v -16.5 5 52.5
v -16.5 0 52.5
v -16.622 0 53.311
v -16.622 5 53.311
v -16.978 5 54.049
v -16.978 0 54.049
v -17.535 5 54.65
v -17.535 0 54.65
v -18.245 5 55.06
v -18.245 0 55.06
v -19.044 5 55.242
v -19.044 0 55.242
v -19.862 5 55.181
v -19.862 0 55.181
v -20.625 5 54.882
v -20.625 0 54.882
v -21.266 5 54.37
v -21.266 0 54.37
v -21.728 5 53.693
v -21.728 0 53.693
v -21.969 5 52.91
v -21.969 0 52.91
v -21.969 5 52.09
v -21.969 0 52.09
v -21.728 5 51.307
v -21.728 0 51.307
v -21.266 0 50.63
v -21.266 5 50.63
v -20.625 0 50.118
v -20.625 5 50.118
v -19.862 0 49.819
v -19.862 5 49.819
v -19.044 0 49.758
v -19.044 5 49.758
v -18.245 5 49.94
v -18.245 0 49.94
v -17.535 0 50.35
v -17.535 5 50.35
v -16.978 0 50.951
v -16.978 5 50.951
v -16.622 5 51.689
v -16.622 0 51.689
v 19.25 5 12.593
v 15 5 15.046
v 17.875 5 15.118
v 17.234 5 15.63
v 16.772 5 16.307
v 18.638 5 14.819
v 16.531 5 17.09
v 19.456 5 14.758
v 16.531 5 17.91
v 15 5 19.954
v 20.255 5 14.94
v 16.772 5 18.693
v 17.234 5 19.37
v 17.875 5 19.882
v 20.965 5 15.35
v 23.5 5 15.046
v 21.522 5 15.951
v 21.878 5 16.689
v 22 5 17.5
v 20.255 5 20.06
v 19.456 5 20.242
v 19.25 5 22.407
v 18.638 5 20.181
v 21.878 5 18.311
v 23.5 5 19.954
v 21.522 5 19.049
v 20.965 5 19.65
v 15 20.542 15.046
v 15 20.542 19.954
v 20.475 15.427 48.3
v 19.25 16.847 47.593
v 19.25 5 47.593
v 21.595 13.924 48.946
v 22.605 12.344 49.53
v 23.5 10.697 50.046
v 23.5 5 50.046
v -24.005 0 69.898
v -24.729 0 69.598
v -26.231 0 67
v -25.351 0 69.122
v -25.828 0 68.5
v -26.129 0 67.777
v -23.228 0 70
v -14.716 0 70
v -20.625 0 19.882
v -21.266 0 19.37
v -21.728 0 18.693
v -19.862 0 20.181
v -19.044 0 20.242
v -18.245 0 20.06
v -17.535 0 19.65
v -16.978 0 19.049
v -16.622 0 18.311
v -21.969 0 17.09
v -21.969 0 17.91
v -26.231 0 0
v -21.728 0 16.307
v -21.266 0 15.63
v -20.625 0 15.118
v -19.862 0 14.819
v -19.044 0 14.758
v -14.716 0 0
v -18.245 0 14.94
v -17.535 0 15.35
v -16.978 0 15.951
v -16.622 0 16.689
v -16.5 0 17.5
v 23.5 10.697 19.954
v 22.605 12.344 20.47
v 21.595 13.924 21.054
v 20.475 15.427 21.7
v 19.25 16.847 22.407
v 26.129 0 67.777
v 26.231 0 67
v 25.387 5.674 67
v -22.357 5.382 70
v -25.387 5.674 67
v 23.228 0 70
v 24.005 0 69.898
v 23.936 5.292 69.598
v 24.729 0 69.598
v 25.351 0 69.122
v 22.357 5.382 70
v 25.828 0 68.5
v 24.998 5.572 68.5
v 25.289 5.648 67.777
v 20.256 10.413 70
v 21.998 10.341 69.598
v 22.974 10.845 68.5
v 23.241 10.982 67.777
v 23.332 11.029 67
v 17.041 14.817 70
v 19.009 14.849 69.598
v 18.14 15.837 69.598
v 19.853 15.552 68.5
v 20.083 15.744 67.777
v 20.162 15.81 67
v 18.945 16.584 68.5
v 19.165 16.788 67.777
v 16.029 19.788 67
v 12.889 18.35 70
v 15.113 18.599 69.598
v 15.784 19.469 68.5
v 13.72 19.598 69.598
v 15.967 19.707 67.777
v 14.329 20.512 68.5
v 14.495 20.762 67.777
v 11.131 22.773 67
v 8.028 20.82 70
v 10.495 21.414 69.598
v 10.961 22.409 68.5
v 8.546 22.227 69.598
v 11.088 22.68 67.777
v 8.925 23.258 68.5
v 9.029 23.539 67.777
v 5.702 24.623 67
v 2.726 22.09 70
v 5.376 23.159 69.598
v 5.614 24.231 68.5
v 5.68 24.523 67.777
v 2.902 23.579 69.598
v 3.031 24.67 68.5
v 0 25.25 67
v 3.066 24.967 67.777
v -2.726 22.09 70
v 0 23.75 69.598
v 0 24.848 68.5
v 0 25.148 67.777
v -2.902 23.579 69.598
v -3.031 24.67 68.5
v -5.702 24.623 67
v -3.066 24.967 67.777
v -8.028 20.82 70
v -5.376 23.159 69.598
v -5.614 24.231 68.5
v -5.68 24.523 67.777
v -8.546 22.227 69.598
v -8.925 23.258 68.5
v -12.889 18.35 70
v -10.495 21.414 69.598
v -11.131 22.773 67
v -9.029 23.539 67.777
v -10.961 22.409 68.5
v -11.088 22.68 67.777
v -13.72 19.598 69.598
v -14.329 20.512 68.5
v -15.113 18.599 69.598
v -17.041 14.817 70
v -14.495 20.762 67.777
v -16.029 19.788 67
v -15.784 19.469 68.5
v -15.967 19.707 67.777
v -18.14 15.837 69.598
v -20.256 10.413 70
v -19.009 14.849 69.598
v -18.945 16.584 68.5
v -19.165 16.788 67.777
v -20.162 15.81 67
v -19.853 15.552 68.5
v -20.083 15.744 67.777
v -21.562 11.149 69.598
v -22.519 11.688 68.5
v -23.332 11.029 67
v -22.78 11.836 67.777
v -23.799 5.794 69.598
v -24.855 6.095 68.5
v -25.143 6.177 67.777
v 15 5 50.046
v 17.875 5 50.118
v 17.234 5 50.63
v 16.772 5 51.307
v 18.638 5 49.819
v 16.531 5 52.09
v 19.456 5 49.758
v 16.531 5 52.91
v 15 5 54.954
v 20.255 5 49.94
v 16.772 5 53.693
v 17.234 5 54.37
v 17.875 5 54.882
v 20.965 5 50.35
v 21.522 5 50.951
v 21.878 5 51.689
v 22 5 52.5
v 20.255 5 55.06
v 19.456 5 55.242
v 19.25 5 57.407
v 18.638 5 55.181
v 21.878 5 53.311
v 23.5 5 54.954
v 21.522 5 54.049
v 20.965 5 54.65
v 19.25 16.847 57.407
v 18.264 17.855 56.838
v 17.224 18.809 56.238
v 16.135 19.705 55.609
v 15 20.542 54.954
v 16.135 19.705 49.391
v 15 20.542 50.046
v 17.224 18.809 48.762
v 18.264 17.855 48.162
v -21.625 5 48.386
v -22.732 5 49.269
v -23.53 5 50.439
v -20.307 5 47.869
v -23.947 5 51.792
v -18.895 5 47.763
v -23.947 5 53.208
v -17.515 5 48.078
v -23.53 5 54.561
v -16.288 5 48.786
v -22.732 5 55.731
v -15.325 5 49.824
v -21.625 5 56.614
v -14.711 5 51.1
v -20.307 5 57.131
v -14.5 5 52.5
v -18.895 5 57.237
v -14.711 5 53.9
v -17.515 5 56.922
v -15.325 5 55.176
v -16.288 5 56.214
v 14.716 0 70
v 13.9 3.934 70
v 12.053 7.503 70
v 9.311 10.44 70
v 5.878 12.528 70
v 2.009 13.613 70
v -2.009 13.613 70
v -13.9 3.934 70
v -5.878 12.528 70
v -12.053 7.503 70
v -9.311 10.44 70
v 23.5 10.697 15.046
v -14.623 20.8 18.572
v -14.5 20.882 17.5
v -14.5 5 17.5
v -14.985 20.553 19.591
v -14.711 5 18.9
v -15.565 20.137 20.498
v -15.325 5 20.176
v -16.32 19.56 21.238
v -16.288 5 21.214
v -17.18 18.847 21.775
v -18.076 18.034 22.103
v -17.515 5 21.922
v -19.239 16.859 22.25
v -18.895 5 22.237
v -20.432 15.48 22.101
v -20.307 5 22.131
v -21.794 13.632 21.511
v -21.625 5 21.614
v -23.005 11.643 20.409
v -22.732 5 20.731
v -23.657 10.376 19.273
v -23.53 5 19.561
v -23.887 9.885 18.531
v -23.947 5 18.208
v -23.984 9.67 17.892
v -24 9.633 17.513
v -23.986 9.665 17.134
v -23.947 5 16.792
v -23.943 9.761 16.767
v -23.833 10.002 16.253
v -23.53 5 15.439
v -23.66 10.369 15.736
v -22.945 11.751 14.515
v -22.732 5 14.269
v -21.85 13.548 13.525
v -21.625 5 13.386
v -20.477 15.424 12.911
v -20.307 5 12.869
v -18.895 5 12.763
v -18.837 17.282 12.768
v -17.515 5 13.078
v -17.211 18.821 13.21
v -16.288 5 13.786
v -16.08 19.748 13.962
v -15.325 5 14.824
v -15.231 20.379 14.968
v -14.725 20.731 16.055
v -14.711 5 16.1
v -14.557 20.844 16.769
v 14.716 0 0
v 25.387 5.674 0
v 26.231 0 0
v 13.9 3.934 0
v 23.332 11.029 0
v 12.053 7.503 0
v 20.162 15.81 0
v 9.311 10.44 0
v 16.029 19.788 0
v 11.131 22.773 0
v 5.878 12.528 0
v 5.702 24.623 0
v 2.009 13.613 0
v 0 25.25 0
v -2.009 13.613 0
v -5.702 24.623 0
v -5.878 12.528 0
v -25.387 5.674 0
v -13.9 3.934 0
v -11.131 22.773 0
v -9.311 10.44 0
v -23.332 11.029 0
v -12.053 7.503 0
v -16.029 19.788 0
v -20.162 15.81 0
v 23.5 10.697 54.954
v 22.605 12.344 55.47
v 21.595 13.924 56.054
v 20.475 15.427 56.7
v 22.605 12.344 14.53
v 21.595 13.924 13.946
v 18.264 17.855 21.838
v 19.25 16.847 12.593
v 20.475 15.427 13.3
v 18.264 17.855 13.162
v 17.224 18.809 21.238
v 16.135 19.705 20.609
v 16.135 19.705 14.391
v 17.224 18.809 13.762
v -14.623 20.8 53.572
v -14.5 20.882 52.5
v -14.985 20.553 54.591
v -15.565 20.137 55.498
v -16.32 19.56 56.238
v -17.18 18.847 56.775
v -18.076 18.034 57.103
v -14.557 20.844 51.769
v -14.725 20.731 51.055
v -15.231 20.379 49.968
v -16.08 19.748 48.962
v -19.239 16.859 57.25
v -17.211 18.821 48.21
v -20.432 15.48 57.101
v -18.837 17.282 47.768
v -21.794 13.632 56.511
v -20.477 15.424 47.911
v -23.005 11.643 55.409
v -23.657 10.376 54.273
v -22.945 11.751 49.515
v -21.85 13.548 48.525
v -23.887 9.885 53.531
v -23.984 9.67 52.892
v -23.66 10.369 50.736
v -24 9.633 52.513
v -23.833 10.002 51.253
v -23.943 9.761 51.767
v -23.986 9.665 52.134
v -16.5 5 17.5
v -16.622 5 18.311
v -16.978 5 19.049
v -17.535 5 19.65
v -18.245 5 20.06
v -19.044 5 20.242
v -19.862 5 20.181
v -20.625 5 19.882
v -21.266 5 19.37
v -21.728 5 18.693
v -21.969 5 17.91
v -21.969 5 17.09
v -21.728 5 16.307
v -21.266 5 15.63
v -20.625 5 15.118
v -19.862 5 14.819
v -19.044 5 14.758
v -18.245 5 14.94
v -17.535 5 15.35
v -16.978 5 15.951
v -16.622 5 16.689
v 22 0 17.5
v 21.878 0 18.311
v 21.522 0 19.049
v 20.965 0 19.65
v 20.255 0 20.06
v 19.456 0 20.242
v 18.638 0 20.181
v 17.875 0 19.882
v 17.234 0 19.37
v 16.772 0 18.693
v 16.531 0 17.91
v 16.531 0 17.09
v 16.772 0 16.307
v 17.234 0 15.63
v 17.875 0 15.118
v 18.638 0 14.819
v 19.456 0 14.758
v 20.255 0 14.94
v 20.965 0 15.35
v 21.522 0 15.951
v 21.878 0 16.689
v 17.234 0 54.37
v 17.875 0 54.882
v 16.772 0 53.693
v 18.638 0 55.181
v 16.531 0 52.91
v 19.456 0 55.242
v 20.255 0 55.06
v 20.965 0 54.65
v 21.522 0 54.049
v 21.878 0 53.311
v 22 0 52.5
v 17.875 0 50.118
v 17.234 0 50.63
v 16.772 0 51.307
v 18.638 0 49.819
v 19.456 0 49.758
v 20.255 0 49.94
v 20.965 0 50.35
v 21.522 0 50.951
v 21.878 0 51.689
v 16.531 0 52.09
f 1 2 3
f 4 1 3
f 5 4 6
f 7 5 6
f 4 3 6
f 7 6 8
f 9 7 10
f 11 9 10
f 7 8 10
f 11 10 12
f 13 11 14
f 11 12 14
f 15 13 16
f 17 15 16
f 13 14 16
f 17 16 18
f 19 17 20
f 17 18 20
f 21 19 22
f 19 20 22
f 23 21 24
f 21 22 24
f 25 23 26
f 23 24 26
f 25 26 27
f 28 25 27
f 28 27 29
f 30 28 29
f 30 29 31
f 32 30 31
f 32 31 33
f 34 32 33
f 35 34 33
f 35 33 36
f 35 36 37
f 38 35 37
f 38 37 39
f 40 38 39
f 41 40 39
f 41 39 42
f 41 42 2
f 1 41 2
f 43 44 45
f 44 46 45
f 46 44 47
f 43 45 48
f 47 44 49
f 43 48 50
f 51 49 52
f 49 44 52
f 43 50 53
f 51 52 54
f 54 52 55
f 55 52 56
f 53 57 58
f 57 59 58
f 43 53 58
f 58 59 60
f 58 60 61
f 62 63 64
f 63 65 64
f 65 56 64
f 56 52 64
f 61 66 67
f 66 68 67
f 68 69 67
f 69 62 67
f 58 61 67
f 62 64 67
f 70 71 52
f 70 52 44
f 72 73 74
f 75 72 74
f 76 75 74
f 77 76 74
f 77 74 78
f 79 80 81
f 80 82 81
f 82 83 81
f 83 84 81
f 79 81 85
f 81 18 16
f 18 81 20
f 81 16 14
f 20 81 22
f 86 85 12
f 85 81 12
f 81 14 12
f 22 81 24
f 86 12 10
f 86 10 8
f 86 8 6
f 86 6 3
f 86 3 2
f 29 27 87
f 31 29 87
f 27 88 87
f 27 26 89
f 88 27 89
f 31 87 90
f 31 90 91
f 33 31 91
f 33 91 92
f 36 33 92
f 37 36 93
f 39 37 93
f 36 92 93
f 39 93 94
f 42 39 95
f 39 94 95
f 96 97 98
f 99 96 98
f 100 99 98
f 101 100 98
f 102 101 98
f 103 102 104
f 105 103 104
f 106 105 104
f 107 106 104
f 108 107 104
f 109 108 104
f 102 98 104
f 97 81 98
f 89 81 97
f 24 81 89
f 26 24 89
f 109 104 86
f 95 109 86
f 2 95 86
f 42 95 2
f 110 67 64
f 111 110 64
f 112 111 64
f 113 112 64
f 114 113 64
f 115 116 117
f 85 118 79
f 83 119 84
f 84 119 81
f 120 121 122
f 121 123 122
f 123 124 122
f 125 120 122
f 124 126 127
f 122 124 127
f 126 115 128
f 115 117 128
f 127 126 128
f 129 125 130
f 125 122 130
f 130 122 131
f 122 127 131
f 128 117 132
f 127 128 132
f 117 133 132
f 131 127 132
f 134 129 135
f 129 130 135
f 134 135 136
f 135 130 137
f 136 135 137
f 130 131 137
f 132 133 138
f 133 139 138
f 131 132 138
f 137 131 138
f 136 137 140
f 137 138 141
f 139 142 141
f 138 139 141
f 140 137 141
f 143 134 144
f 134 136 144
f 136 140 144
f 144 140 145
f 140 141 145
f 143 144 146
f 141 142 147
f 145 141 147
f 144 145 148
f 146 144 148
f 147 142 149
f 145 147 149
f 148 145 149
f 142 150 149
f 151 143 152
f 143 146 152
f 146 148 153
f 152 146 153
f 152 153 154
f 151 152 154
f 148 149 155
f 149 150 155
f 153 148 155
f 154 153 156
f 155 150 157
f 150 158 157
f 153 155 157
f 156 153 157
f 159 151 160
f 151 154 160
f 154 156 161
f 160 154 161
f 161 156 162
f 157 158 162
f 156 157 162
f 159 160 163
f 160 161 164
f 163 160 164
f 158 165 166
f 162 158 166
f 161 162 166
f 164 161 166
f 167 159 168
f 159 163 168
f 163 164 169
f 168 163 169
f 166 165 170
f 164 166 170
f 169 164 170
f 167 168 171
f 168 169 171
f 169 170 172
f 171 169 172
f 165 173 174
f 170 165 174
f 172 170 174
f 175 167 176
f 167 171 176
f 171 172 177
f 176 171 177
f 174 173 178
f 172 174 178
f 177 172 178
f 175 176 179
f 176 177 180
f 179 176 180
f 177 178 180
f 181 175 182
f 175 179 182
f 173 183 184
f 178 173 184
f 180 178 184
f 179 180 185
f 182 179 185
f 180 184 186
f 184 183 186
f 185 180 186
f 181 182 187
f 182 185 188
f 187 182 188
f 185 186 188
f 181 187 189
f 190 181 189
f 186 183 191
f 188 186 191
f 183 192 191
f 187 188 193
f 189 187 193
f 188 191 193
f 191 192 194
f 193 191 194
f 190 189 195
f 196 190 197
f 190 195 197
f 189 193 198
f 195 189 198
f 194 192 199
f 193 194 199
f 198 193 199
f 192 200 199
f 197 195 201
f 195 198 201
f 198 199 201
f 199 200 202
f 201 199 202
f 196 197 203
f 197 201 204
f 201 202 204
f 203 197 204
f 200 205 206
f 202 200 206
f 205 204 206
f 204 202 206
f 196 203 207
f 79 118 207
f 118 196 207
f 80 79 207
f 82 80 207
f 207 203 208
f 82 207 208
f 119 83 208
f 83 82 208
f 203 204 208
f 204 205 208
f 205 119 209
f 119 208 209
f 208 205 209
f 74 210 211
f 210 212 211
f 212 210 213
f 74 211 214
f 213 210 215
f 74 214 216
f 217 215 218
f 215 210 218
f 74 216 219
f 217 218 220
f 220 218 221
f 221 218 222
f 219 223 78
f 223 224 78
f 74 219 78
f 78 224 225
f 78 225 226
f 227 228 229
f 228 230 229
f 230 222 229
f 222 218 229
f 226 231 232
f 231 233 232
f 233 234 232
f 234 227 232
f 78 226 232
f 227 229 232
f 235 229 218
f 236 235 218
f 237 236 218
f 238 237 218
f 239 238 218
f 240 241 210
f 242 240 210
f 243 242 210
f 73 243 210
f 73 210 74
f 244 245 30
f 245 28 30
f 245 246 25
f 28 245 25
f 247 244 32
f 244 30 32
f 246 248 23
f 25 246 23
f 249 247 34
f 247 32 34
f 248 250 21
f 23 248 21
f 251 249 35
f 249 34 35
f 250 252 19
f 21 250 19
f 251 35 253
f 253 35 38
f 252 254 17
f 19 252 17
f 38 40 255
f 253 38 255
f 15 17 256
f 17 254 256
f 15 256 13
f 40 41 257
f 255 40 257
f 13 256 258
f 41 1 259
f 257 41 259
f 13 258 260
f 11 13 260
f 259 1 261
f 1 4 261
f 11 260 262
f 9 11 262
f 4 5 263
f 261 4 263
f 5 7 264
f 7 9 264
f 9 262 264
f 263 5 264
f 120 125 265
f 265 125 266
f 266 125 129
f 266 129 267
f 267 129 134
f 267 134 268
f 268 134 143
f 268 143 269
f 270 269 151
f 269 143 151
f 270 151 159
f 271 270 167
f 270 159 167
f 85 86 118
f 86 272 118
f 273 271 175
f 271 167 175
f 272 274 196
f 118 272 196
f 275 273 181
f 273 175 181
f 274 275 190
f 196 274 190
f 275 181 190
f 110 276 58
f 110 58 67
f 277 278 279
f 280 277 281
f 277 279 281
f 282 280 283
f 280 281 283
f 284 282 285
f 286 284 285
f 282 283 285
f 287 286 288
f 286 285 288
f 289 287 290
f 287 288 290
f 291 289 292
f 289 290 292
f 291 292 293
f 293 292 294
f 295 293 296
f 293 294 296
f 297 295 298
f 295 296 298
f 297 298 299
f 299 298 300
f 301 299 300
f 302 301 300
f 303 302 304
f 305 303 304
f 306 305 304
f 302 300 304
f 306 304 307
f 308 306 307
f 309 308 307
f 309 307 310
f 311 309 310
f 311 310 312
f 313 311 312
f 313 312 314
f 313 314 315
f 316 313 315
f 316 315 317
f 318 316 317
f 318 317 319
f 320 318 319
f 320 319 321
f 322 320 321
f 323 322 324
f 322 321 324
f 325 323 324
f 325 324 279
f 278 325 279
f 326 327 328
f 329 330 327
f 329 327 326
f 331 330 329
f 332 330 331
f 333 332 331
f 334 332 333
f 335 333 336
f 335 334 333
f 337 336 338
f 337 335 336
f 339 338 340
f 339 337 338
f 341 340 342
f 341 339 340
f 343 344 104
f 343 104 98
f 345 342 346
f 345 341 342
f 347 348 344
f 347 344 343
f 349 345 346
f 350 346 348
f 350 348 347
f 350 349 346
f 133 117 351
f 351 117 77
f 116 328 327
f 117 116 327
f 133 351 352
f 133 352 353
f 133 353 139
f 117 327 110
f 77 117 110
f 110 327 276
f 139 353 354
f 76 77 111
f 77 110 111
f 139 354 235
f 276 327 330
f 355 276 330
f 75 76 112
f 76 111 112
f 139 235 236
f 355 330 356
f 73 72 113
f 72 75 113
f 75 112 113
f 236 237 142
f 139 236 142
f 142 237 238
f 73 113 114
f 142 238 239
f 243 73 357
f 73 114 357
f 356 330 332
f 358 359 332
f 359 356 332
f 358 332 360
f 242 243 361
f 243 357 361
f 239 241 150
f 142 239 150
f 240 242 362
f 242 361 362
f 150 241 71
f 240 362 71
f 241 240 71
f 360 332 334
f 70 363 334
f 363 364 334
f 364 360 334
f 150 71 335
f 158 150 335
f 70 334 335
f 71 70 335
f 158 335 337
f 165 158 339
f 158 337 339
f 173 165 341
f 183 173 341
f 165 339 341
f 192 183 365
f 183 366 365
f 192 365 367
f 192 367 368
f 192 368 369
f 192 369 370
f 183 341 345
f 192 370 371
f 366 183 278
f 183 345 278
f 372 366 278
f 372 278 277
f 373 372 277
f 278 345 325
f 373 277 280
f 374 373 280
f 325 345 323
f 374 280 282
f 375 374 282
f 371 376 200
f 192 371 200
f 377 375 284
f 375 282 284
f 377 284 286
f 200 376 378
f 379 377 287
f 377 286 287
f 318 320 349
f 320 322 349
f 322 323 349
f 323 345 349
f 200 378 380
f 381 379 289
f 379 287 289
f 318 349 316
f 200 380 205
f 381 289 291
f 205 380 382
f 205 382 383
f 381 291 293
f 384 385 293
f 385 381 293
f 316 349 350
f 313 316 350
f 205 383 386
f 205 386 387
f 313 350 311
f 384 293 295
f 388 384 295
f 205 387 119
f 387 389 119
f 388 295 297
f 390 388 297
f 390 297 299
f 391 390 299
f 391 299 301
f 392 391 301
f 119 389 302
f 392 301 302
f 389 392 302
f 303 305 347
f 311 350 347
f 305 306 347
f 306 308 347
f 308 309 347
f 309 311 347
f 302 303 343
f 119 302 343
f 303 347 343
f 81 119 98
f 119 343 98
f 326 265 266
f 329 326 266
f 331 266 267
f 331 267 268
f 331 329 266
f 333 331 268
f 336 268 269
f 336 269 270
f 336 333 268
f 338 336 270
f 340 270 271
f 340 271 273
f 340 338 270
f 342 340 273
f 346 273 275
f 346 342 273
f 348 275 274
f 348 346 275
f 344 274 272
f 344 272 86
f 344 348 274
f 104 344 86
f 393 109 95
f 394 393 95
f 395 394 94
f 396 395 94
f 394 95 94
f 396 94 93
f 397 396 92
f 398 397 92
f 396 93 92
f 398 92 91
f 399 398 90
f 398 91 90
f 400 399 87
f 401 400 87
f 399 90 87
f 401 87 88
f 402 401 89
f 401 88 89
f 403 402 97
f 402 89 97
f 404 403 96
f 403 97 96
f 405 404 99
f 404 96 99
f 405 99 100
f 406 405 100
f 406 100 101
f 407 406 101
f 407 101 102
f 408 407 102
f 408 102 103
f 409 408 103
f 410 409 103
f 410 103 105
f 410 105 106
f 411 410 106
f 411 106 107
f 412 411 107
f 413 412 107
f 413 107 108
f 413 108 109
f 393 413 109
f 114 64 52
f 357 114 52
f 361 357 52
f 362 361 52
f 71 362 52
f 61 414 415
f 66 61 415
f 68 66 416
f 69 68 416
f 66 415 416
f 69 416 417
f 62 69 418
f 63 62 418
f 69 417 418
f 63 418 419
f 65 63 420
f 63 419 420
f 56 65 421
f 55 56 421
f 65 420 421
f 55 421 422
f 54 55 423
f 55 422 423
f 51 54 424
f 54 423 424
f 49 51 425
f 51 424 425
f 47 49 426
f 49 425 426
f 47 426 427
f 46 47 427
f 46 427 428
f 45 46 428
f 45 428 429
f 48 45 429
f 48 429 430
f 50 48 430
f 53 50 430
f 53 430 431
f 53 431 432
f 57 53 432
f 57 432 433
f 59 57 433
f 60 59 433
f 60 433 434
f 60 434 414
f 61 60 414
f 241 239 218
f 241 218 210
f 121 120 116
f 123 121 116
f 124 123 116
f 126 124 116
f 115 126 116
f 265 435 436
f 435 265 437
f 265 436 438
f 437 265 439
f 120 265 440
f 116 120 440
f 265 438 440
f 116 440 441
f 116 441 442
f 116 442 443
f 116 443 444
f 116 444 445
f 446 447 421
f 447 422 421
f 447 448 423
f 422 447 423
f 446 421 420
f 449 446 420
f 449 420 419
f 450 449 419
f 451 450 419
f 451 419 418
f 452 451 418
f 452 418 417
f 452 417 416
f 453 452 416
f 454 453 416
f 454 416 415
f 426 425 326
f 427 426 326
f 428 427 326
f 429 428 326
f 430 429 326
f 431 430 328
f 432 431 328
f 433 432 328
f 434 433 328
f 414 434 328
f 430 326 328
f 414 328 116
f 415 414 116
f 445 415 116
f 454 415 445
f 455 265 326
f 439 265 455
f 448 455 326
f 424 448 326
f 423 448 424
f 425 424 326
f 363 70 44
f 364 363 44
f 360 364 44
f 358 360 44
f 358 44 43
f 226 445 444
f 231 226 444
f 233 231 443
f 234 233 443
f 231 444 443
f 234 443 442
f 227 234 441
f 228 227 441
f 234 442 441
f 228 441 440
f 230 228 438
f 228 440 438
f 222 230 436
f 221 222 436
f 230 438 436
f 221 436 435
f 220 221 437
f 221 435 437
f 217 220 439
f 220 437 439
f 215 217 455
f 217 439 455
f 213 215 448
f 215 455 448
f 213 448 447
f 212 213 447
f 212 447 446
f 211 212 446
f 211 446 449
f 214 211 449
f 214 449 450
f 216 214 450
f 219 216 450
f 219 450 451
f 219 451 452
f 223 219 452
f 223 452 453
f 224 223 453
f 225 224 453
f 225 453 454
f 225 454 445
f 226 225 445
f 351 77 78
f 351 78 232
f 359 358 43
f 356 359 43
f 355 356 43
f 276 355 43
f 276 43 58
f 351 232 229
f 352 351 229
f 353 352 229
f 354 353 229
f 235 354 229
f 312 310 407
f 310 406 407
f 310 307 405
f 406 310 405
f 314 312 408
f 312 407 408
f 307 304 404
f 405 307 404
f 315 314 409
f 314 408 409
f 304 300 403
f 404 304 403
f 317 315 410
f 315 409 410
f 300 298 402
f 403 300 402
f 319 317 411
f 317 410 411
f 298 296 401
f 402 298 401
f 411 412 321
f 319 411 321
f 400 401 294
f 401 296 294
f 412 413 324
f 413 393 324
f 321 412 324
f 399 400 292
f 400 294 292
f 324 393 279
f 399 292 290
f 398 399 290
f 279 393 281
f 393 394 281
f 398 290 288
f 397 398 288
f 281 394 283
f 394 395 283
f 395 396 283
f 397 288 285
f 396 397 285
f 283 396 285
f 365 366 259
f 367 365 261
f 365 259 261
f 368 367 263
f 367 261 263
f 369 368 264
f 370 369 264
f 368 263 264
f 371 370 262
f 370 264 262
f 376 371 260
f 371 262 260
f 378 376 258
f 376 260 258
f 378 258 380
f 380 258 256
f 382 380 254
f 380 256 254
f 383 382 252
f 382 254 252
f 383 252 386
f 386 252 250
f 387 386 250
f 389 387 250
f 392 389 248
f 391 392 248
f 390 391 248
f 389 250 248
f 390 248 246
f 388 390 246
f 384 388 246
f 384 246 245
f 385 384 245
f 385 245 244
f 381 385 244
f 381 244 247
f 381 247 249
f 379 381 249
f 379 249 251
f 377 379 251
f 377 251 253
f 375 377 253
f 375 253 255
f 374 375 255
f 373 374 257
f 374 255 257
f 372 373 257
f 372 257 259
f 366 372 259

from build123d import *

# Parameters (mm, degrees)
PAD_DEPTH       = 70
SKETCH001_R     = 2.75
POCKET_DEPTH    = 25.251
SKETCH002_R     = 4.75
POCKET001_DEPTH = 20.251
FILLET_R        = 3


with BuildPart() as part:
    # Sketch → Pad (new body)
    with BuildSketch(Plane.XY):
        with BuildLine():
            ThreePointArc((14.716063, 0), (0, 13.75), (-14.716063, 0))
            Line((-26.230945, 0), (-14.716063, 0))
            ThreePointArc((26.230945, 0), (0, 25.25), (-26.230945, 0))
            Line((14.716063, 0), (26.230945, 0))
        make_face()
    extrude(amount=PAD_DEPTH)

    # Sketch001 (on Face2 of Pad) → Pocket (cut, through all)
    with BuildSketch(Plane.XZ):
        with Locations((-19.25, 17.5)):
            Circle(SKETCH001_R)
        with Locations((19.25, 17.5)):
            Circle(SKETCH001_R)
        with Locations((19.25, 52.5)):
            Circle(SKETCH001_R)
        with Locations((-19.25, 52.5)):
            Circle(SKETCH001_R)
    extrude(amount=-POCKET_DEPTH, mode=Mode.SUBTRACT)

    # Sketch002 (on DatumPlane) → Pocket001 (cut, through all)
    with BuildSketch(Plane.XZ.offset(-5)):
        with Locations((-19.25, 17.5)):
            Circle(SKETCH002_R)
        with Locations((-19.25, 52.5)):
            Circle(SKETCH002_R)
        Polygon((19.25, 12.592523), (23.5, 15.046261), (23.5, 19.953739), (19.25, 22.407477), (15, 19.953739), (15, 15.046261), align=None)
        Polygon((19.25, 47.592523), (23.5, 50.046261), (23.5, 54.953739), (19.25, 57.407477), (15, 54.953739), (15, 50.046261), align=None)
    extrude(amount=-POCKET001_DEPTH, mode=Mode.SUBTRACT)

    # Fillet
    fillet_edges = [part.edges().sort_by_distance(p)[0] for p in [
        (0, 25.25, 70),
    ]]
    fillet(fillet_edges, radius=FILLET_R)


solid = part.part
